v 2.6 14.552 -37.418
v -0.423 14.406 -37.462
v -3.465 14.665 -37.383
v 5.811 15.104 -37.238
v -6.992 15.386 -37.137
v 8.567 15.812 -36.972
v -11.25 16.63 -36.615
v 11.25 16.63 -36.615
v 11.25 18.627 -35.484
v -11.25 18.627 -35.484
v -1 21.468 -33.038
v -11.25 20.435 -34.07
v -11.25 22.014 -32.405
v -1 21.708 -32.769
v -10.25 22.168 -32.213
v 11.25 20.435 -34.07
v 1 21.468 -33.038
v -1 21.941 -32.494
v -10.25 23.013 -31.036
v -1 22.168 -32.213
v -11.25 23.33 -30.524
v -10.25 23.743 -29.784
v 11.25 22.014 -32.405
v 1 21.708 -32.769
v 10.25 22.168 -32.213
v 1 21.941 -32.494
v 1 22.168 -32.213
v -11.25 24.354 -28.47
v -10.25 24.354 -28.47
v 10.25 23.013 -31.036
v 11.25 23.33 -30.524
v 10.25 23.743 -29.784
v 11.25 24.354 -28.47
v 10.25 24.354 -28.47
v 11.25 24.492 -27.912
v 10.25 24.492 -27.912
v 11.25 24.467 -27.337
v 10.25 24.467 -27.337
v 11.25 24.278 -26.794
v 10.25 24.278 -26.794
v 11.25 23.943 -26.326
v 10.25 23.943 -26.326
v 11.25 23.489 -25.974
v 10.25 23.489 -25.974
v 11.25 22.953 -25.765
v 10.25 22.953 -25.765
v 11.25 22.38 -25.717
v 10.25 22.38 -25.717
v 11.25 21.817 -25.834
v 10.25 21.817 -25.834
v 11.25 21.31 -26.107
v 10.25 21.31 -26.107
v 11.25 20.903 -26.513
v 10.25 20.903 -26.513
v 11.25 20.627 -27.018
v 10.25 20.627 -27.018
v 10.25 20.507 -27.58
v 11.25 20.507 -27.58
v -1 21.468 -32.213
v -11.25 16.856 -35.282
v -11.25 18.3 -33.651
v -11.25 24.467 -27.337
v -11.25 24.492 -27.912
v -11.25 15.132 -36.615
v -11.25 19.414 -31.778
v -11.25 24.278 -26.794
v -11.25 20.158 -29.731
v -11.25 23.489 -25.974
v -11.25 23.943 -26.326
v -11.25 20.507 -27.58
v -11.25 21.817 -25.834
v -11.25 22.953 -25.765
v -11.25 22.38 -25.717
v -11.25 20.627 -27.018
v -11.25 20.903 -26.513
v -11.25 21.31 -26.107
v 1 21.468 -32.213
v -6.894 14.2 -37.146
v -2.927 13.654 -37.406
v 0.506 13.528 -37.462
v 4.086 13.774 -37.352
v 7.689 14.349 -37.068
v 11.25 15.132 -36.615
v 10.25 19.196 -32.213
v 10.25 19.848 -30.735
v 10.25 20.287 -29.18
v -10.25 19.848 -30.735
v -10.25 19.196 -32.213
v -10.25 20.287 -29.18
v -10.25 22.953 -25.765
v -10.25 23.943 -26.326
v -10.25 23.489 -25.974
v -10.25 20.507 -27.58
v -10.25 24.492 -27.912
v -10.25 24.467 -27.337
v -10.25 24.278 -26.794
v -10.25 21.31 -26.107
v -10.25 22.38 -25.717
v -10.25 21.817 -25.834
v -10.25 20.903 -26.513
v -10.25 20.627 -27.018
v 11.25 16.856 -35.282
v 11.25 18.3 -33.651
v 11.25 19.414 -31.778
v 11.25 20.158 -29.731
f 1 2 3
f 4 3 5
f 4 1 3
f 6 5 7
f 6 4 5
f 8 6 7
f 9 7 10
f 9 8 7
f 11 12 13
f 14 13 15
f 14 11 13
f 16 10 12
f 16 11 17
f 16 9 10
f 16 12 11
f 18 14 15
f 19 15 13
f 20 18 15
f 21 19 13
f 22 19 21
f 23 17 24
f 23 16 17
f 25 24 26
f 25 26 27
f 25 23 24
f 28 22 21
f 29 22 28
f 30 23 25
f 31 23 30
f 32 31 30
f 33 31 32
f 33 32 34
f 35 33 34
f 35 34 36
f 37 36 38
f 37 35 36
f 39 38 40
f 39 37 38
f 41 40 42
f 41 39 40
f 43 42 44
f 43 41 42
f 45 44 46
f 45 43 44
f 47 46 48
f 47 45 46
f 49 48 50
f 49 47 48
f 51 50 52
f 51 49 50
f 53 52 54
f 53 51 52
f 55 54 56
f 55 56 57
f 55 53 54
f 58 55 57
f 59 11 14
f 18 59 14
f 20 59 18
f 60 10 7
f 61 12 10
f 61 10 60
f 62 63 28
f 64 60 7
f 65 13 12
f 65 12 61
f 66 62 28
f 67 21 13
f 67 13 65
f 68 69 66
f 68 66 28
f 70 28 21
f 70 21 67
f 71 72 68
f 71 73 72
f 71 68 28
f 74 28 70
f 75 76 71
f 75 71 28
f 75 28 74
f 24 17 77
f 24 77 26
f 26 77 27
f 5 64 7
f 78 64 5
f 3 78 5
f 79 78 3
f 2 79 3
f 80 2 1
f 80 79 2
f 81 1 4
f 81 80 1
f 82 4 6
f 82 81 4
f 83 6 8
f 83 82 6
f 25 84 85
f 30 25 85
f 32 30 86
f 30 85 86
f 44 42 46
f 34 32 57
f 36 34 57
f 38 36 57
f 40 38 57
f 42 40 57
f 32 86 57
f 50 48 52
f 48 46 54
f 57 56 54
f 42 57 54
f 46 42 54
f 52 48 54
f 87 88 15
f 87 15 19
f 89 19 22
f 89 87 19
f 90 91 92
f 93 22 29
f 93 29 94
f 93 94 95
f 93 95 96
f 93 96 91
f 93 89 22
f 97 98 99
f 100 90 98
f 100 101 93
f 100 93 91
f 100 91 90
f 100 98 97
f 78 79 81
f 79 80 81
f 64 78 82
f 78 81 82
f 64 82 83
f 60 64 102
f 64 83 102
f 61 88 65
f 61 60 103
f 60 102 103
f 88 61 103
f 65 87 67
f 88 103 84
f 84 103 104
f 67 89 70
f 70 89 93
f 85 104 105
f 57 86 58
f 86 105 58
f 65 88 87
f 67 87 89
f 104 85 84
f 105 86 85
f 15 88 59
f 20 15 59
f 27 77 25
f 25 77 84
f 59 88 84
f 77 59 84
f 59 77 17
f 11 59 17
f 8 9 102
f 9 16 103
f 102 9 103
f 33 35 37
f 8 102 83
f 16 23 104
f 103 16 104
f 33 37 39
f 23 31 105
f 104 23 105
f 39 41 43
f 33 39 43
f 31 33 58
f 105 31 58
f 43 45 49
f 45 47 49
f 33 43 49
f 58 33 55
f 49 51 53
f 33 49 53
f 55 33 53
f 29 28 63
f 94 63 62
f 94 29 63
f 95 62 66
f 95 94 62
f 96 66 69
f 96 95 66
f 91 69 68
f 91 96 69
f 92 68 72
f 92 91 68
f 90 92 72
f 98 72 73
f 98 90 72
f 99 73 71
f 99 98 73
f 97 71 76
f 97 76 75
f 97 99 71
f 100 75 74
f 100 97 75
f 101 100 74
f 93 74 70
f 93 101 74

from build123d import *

# Parameters (mm, degrees)
PAD005_DEPTH    = 11.25
SKETCH036_W     = 20.5
SKETCH036_H     = 6.6332701871
POCKET002_DEPTH = 24.5032991847
POCKET003_DEPTH = 1


with BuildPart() as part:
    # Sketch035 → Pad005 (new body, symmetric)
    with BuildSketch(Plane.YZ):
        with BuildLine():
            ThreePointArc((13.3821850753, -37.5234542499), (18.3608599681, -33.5666154319), (20.5067387818, -27.5800486999))
            ThreePointArc((24.3536477534, -28.4698782284), (22.9530190653, -25.7646841778), (20.5067387818, -27.5800486999))
            ThreePointArc((13.4426775015, -37.713318887), (20.0290903971, -34.4265472751), (24.3536477534, -28.4698782284))
            ThreePointArc((13.3821850753, -37.5234542499), (13.3252924513, -37.6461497146), (13.4426775015, -37.713318887))
        make_face()
    extrude(amount=PAD005_DEPTH, both=True)

    # Sketch036 → Pocket002 (cut, through all)
    with BuildSketch(Plane.XZ):
        with Locations((0, -28.8966837934)):
            Rectangle(SKETCH036_W, SKETCH036_H)
        with BuildLine():
            ThreePointArc((-12.5299423012, -36.4092487677), (0, -37.463318887), (12.5299423012, -36.4092487677))
            Line((12.5299423012, -40.220734), (12.5299423012, -36.4092487677))
            Line((-12.5299423012, -40.220734), (12.5299423012, -40.220734))
            Line((-12.5299423012, -36.4092487677), (-12.5299423012, -40.220734))
        make_face()
    extrude(amount=-POCKET002_DEPTH, mode=Mode.SUBTRACT)

    # Sketch037 → Pocket003 (cut, symmetric)
    with BuildSketch(Plane.YZ):
        with BuildLine():
            Line((22.16829374, -32.213318887), (21.46829374, -32.213318887))
            Line((21.46829374, -32.213318887), (21.46829374, -33.0380523289))
            ThreePointArc((21.46829374, -33.0380523289), (21.8254978862, -32.6318001925), (22.16829374, -32.213318887))
        make_face()
    extrude(amount=POCKET003_DEPTH, both=True, mode=Mode.SUBTRACT)


solid = part.part
